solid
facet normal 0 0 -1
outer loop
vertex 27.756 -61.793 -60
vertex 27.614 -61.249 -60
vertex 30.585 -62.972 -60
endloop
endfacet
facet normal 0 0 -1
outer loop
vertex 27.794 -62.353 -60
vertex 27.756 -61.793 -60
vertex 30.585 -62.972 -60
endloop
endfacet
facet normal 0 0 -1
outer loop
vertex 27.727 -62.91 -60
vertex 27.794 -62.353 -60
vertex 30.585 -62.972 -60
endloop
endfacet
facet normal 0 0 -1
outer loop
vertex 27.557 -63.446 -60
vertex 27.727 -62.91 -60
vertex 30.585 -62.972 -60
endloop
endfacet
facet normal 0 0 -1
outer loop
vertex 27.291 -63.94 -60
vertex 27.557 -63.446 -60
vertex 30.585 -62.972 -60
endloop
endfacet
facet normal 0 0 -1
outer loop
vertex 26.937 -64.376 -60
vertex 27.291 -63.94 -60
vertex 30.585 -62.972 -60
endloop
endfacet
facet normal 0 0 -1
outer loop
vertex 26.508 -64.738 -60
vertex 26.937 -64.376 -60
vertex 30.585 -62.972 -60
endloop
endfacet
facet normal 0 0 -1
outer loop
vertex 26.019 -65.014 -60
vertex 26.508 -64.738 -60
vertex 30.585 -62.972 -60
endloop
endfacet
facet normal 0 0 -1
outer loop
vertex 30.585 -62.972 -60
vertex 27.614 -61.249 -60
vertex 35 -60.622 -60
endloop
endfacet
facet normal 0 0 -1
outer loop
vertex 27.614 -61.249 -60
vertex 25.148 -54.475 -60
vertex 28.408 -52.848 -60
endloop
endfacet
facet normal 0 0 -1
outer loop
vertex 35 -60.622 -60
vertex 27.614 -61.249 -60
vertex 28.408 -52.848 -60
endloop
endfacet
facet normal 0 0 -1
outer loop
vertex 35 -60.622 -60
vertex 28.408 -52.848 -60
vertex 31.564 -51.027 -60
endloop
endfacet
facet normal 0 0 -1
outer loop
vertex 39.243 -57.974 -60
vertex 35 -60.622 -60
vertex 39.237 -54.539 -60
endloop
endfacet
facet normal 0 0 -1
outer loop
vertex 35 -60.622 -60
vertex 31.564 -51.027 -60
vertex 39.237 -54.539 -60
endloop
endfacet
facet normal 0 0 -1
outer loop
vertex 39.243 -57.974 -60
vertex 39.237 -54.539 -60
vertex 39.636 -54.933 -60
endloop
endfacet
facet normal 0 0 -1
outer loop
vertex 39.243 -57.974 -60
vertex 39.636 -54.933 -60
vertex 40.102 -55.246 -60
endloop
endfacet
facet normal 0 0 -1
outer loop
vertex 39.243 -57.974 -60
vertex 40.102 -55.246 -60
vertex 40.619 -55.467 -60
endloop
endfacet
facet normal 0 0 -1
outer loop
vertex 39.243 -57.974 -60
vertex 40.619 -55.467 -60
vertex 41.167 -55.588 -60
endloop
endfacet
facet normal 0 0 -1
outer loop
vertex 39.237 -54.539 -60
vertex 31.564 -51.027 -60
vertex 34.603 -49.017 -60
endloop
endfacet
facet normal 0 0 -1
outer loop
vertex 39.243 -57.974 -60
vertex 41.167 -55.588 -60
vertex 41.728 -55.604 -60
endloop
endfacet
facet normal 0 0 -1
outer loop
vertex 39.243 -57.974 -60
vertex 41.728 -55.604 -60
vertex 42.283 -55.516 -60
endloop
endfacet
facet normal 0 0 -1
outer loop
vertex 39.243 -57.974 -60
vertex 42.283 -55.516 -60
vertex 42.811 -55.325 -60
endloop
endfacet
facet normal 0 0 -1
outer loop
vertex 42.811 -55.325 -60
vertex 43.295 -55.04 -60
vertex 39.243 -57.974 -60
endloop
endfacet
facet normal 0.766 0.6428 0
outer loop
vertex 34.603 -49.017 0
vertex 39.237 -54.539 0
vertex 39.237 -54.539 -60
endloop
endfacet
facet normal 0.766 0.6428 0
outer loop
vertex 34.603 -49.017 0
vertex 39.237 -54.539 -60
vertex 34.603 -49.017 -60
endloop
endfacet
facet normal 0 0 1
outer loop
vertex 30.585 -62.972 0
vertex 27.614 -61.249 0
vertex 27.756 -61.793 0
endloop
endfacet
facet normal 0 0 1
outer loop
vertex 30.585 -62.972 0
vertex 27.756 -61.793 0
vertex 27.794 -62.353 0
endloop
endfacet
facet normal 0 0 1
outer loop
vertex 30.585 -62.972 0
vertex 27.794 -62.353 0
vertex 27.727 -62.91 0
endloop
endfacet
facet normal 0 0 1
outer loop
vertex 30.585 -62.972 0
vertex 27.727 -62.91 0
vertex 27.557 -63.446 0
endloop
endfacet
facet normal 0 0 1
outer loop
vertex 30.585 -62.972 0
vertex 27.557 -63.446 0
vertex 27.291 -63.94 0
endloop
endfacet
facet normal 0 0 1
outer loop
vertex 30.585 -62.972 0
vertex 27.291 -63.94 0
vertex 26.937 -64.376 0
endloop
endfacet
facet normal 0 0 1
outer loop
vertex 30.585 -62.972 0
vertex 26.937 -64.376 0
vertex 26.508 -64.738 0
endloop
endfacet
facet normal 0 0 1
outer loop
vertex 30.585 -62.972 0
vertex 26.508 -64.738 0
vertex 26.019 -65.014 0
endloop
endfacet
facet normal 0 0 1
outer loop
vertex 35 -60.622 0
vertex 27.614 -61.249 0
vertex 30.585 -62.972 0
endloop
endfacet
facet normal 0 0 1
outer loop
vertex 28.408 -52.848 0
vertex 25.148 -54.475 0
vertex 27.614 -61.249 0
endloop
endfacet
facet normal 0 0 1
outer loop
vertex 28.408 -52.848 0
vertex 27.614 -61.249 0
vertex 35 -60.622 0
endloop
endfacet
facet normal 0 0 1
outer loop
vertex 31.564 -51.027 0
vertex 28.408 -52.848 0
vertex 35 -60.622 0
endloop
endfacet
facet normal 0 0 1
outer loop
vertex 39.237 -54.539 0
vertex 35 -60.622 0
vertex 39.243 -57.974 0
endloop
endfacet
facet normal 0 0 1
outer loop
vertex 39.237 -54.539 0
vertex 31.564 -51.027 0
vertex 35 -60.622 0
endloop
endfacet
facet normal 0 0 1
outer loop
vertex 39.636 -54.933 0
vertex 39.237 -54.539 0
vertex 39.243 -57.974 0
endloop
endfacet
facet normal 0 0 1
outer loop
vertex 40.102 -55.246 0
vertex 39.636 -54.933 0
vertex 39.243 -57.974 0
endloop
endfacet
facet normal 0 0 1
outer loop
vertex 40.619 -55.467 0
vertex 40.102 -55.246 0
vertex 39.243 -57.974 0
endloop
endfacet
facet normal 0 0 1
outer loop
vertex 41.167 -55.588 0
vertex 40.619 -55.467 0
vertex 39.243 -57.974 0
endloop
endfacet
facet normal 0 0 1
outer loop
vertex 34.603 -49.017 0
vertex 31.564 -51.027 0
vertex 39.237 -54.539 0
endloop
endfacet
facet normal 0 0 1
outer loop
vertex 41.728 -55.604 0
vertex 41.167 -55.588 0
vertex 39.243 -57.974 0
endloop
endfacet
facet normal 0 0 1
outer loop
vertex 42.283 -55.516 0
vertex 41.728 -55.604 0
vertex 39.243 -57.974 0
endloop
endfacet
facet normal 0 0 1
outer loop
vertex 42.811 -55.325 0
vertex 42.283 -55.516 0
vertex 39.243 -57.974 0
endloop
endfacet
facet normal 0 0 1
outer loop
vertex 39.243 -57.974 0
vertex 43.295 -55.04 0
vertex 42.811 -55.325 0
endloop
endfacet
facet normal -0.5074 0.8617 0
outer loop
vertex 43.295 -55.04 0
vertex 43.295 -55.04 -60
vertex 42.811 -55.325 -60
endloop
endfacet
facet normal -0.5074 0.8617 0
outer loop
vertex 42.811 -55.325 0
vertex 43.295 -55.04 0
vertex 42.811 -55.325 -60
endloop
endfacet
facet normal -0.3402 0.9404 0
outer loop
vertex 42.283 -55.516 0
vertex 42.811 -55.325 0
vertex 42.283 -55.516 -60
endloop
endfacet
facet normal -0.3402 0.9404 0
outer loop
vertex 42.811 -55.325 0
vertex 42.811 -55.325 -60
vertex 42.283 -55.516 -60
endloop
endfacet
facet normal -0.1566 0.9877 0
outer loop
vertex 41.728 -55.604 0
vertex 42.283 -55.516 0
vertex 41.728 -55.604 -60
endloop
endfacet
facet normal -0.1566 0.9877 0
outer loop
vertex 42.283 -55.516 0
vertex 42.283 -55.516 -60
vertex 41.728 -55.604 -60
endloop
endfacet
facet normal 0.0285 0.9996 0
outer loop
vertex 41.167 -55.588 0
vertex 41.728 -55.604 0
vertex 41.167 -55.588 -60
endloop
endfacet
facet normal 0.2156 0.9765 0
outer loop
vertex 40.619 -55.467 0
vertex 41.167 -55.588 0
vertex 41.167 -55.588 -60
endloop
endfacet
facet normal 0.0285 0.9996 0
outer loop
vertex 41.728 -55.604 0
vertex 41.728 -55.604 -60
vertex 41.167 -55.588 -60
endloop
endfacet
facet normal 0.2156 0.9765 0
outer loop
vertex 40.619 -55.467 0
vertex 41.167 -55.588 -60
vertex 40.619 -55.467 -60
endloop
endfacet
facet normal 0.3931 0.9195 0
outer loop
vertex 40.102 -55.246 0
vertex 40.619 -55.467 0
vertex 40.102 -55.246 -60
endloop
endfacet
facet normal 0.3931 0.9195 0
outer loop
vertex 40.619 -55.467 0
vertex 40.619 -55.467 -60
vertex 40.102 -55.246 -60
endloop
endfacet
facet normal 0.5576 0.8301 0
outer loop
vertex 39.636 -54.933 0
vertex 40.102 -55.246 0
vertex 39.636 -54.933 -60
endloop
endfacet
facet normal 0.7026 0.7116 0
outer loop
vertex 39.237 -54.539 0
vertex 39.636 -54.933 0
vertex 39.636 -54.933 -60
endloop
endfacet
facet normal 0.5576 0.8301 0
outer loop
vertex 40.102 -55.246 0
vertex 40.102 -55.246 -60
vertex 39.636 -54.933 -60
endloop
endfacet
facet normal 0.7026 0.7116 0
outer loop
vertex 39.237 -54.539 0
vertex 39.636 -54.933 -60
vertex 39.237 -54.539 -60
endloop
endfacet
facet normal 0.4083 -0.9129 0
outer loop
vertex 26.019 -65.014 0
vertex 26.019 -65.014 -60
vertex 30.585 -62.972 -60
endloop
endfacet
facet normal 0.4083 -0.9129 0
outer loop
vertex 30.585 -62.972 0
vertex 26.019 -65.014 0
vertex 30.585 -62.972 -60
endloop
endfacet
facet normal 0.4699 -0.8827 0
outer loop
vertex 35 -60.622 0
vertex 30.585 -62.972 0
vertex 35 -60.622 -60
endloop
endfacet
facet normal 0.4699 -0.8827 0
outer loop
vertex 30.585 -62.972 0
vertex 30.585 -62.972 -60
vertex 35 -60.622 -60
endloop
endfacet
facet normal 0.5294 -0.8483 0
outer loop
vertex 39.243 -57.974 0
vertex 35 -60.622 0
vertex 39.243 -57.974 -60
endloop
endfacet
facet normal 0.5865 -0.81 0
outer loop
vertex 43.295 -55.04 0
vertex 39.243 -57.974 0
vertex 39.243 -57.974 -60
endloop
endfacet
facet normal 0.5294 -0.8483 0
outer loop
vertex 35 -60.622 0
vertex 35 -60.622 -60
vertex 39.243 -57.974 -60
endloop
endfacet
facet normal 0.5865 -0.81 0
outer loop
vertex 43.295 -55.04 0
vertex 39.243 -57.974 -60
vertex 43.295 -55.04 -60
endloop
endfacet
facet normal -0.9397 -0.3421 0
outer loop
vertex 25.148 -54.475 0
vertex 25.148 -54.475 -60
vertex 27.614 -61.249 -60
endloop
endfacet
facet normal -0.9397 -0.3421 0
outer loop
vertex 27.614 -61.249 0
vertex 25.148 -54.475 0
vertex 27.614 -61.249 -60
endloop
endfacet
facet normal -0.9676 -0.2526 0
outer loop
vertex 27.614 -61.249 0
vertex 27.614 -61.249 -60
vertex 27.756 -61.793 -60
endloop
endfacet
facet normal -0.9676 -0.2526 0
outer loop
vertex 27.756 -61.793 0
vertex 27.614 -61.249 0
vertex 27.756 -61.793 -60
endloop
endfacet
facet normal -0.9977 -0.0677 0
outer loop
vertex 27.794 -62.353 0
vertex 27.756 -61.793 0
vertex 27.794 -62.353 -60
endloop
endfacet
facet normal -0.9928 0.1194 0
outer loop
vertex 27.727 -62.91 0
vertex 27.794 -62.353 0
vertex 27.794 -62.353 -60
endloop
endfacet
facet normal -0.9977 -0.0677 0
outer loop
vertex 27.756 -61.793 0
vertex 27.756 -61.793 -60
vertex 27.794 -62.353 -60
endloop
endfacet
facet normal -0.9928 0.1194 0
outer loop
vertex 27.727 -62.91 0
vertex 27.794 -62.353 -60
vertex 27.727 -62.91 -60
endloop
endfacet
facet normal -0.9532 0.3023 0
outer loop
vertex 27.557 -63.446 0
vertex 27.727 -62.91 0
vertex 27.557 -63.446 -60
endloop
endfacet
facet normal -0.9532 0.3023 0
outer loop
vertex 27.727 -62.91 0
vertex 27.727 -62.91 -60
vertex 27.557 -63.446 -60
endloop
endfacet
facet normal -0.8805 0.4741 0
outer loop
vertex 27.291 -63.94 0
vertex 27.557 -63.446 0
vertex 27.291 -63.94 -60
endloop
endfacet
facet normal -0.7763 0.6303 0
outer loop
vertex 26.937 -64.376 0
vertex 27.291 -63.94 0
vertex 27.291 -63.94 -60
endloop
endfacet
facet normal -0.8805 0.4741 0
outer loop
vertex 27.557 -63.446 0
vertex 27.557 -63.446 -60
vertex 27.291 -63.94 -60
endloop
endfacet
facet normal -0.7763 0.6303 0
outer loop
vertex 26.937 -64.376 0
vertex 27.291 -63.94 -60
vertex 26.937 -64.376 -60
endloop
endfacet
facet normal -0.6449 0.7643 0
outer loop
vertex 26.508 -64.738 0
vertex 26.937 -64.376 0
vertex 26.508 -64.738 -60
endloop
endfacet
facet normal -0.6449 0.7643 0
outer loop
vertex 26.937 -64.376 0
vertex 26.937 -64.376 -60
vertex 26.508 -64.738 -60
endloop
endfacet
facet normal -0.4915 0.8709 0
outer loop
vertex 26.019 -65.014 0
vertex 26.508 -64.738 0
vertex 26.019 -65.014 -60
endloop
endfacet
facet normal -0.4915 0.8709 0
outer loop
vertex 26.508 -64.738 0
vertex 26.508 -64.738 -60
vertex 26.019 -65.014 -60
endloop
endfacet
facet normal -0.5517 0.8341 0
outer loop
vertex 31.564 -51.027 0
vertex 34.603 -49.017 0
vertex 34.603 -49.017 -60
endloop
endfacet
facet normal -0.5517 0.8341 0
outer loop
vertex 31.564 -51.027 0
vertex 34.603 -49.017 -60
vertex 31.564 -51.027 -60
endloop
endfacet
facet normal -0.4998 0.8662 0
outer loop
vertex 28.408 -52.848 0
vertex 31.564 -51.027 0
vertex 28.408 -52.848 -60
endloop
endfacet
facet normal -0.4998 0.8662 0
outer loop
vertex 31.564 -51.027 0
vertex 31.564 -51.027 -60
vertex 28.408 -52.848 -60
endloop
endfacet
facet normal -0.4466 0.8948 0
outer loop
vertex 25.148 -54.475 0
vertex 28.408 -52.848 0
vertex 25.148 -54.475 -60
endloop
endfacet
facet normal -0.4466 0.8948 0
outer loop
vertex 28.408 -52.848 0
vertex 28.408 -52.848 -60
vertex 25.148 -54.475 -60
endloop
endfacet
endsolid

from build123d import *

# Parameters (mm, degrees)
BOSS_EXTRUDE1_START = -60
BOSS_EXTRUDE1_DEPTH = 60


with BuildPart() as part:
    # Sketch1 → Boss-Extrude1 (new body)
    with BuildSketch(Plane.XY.offset(BOSS_EXTRUDE1_START)):
        with BuildLine():
            ThreePointArc((34.60288698, -49.016734007), (30, -51.961524227), (25.14829337, -54.475346172))
            Line((25.14829337, -54.475346172), (27.613812707, -61.249304876))
            ThreePointArc((27.613812707, -61.249304876), (27.55707569, -63.445610174), (26.01881055, -65.014277255))
            ThreePointArc((26.01881055, -65.014277255), (34.999997878, -60.621774589), (43.294610437, -55.040089541))
            ThreePointArc((43.294610437, -55.040089541), (41.166972324, -55.587932689), (39.236547633, -54.538915737))
            Line((39.236547633, -54.538915737), (34.60288698, -49.016734007))
        make_face()
    extrude(amount=BOSS_EXTRUDE1_DEPTH)


solid = part.part
